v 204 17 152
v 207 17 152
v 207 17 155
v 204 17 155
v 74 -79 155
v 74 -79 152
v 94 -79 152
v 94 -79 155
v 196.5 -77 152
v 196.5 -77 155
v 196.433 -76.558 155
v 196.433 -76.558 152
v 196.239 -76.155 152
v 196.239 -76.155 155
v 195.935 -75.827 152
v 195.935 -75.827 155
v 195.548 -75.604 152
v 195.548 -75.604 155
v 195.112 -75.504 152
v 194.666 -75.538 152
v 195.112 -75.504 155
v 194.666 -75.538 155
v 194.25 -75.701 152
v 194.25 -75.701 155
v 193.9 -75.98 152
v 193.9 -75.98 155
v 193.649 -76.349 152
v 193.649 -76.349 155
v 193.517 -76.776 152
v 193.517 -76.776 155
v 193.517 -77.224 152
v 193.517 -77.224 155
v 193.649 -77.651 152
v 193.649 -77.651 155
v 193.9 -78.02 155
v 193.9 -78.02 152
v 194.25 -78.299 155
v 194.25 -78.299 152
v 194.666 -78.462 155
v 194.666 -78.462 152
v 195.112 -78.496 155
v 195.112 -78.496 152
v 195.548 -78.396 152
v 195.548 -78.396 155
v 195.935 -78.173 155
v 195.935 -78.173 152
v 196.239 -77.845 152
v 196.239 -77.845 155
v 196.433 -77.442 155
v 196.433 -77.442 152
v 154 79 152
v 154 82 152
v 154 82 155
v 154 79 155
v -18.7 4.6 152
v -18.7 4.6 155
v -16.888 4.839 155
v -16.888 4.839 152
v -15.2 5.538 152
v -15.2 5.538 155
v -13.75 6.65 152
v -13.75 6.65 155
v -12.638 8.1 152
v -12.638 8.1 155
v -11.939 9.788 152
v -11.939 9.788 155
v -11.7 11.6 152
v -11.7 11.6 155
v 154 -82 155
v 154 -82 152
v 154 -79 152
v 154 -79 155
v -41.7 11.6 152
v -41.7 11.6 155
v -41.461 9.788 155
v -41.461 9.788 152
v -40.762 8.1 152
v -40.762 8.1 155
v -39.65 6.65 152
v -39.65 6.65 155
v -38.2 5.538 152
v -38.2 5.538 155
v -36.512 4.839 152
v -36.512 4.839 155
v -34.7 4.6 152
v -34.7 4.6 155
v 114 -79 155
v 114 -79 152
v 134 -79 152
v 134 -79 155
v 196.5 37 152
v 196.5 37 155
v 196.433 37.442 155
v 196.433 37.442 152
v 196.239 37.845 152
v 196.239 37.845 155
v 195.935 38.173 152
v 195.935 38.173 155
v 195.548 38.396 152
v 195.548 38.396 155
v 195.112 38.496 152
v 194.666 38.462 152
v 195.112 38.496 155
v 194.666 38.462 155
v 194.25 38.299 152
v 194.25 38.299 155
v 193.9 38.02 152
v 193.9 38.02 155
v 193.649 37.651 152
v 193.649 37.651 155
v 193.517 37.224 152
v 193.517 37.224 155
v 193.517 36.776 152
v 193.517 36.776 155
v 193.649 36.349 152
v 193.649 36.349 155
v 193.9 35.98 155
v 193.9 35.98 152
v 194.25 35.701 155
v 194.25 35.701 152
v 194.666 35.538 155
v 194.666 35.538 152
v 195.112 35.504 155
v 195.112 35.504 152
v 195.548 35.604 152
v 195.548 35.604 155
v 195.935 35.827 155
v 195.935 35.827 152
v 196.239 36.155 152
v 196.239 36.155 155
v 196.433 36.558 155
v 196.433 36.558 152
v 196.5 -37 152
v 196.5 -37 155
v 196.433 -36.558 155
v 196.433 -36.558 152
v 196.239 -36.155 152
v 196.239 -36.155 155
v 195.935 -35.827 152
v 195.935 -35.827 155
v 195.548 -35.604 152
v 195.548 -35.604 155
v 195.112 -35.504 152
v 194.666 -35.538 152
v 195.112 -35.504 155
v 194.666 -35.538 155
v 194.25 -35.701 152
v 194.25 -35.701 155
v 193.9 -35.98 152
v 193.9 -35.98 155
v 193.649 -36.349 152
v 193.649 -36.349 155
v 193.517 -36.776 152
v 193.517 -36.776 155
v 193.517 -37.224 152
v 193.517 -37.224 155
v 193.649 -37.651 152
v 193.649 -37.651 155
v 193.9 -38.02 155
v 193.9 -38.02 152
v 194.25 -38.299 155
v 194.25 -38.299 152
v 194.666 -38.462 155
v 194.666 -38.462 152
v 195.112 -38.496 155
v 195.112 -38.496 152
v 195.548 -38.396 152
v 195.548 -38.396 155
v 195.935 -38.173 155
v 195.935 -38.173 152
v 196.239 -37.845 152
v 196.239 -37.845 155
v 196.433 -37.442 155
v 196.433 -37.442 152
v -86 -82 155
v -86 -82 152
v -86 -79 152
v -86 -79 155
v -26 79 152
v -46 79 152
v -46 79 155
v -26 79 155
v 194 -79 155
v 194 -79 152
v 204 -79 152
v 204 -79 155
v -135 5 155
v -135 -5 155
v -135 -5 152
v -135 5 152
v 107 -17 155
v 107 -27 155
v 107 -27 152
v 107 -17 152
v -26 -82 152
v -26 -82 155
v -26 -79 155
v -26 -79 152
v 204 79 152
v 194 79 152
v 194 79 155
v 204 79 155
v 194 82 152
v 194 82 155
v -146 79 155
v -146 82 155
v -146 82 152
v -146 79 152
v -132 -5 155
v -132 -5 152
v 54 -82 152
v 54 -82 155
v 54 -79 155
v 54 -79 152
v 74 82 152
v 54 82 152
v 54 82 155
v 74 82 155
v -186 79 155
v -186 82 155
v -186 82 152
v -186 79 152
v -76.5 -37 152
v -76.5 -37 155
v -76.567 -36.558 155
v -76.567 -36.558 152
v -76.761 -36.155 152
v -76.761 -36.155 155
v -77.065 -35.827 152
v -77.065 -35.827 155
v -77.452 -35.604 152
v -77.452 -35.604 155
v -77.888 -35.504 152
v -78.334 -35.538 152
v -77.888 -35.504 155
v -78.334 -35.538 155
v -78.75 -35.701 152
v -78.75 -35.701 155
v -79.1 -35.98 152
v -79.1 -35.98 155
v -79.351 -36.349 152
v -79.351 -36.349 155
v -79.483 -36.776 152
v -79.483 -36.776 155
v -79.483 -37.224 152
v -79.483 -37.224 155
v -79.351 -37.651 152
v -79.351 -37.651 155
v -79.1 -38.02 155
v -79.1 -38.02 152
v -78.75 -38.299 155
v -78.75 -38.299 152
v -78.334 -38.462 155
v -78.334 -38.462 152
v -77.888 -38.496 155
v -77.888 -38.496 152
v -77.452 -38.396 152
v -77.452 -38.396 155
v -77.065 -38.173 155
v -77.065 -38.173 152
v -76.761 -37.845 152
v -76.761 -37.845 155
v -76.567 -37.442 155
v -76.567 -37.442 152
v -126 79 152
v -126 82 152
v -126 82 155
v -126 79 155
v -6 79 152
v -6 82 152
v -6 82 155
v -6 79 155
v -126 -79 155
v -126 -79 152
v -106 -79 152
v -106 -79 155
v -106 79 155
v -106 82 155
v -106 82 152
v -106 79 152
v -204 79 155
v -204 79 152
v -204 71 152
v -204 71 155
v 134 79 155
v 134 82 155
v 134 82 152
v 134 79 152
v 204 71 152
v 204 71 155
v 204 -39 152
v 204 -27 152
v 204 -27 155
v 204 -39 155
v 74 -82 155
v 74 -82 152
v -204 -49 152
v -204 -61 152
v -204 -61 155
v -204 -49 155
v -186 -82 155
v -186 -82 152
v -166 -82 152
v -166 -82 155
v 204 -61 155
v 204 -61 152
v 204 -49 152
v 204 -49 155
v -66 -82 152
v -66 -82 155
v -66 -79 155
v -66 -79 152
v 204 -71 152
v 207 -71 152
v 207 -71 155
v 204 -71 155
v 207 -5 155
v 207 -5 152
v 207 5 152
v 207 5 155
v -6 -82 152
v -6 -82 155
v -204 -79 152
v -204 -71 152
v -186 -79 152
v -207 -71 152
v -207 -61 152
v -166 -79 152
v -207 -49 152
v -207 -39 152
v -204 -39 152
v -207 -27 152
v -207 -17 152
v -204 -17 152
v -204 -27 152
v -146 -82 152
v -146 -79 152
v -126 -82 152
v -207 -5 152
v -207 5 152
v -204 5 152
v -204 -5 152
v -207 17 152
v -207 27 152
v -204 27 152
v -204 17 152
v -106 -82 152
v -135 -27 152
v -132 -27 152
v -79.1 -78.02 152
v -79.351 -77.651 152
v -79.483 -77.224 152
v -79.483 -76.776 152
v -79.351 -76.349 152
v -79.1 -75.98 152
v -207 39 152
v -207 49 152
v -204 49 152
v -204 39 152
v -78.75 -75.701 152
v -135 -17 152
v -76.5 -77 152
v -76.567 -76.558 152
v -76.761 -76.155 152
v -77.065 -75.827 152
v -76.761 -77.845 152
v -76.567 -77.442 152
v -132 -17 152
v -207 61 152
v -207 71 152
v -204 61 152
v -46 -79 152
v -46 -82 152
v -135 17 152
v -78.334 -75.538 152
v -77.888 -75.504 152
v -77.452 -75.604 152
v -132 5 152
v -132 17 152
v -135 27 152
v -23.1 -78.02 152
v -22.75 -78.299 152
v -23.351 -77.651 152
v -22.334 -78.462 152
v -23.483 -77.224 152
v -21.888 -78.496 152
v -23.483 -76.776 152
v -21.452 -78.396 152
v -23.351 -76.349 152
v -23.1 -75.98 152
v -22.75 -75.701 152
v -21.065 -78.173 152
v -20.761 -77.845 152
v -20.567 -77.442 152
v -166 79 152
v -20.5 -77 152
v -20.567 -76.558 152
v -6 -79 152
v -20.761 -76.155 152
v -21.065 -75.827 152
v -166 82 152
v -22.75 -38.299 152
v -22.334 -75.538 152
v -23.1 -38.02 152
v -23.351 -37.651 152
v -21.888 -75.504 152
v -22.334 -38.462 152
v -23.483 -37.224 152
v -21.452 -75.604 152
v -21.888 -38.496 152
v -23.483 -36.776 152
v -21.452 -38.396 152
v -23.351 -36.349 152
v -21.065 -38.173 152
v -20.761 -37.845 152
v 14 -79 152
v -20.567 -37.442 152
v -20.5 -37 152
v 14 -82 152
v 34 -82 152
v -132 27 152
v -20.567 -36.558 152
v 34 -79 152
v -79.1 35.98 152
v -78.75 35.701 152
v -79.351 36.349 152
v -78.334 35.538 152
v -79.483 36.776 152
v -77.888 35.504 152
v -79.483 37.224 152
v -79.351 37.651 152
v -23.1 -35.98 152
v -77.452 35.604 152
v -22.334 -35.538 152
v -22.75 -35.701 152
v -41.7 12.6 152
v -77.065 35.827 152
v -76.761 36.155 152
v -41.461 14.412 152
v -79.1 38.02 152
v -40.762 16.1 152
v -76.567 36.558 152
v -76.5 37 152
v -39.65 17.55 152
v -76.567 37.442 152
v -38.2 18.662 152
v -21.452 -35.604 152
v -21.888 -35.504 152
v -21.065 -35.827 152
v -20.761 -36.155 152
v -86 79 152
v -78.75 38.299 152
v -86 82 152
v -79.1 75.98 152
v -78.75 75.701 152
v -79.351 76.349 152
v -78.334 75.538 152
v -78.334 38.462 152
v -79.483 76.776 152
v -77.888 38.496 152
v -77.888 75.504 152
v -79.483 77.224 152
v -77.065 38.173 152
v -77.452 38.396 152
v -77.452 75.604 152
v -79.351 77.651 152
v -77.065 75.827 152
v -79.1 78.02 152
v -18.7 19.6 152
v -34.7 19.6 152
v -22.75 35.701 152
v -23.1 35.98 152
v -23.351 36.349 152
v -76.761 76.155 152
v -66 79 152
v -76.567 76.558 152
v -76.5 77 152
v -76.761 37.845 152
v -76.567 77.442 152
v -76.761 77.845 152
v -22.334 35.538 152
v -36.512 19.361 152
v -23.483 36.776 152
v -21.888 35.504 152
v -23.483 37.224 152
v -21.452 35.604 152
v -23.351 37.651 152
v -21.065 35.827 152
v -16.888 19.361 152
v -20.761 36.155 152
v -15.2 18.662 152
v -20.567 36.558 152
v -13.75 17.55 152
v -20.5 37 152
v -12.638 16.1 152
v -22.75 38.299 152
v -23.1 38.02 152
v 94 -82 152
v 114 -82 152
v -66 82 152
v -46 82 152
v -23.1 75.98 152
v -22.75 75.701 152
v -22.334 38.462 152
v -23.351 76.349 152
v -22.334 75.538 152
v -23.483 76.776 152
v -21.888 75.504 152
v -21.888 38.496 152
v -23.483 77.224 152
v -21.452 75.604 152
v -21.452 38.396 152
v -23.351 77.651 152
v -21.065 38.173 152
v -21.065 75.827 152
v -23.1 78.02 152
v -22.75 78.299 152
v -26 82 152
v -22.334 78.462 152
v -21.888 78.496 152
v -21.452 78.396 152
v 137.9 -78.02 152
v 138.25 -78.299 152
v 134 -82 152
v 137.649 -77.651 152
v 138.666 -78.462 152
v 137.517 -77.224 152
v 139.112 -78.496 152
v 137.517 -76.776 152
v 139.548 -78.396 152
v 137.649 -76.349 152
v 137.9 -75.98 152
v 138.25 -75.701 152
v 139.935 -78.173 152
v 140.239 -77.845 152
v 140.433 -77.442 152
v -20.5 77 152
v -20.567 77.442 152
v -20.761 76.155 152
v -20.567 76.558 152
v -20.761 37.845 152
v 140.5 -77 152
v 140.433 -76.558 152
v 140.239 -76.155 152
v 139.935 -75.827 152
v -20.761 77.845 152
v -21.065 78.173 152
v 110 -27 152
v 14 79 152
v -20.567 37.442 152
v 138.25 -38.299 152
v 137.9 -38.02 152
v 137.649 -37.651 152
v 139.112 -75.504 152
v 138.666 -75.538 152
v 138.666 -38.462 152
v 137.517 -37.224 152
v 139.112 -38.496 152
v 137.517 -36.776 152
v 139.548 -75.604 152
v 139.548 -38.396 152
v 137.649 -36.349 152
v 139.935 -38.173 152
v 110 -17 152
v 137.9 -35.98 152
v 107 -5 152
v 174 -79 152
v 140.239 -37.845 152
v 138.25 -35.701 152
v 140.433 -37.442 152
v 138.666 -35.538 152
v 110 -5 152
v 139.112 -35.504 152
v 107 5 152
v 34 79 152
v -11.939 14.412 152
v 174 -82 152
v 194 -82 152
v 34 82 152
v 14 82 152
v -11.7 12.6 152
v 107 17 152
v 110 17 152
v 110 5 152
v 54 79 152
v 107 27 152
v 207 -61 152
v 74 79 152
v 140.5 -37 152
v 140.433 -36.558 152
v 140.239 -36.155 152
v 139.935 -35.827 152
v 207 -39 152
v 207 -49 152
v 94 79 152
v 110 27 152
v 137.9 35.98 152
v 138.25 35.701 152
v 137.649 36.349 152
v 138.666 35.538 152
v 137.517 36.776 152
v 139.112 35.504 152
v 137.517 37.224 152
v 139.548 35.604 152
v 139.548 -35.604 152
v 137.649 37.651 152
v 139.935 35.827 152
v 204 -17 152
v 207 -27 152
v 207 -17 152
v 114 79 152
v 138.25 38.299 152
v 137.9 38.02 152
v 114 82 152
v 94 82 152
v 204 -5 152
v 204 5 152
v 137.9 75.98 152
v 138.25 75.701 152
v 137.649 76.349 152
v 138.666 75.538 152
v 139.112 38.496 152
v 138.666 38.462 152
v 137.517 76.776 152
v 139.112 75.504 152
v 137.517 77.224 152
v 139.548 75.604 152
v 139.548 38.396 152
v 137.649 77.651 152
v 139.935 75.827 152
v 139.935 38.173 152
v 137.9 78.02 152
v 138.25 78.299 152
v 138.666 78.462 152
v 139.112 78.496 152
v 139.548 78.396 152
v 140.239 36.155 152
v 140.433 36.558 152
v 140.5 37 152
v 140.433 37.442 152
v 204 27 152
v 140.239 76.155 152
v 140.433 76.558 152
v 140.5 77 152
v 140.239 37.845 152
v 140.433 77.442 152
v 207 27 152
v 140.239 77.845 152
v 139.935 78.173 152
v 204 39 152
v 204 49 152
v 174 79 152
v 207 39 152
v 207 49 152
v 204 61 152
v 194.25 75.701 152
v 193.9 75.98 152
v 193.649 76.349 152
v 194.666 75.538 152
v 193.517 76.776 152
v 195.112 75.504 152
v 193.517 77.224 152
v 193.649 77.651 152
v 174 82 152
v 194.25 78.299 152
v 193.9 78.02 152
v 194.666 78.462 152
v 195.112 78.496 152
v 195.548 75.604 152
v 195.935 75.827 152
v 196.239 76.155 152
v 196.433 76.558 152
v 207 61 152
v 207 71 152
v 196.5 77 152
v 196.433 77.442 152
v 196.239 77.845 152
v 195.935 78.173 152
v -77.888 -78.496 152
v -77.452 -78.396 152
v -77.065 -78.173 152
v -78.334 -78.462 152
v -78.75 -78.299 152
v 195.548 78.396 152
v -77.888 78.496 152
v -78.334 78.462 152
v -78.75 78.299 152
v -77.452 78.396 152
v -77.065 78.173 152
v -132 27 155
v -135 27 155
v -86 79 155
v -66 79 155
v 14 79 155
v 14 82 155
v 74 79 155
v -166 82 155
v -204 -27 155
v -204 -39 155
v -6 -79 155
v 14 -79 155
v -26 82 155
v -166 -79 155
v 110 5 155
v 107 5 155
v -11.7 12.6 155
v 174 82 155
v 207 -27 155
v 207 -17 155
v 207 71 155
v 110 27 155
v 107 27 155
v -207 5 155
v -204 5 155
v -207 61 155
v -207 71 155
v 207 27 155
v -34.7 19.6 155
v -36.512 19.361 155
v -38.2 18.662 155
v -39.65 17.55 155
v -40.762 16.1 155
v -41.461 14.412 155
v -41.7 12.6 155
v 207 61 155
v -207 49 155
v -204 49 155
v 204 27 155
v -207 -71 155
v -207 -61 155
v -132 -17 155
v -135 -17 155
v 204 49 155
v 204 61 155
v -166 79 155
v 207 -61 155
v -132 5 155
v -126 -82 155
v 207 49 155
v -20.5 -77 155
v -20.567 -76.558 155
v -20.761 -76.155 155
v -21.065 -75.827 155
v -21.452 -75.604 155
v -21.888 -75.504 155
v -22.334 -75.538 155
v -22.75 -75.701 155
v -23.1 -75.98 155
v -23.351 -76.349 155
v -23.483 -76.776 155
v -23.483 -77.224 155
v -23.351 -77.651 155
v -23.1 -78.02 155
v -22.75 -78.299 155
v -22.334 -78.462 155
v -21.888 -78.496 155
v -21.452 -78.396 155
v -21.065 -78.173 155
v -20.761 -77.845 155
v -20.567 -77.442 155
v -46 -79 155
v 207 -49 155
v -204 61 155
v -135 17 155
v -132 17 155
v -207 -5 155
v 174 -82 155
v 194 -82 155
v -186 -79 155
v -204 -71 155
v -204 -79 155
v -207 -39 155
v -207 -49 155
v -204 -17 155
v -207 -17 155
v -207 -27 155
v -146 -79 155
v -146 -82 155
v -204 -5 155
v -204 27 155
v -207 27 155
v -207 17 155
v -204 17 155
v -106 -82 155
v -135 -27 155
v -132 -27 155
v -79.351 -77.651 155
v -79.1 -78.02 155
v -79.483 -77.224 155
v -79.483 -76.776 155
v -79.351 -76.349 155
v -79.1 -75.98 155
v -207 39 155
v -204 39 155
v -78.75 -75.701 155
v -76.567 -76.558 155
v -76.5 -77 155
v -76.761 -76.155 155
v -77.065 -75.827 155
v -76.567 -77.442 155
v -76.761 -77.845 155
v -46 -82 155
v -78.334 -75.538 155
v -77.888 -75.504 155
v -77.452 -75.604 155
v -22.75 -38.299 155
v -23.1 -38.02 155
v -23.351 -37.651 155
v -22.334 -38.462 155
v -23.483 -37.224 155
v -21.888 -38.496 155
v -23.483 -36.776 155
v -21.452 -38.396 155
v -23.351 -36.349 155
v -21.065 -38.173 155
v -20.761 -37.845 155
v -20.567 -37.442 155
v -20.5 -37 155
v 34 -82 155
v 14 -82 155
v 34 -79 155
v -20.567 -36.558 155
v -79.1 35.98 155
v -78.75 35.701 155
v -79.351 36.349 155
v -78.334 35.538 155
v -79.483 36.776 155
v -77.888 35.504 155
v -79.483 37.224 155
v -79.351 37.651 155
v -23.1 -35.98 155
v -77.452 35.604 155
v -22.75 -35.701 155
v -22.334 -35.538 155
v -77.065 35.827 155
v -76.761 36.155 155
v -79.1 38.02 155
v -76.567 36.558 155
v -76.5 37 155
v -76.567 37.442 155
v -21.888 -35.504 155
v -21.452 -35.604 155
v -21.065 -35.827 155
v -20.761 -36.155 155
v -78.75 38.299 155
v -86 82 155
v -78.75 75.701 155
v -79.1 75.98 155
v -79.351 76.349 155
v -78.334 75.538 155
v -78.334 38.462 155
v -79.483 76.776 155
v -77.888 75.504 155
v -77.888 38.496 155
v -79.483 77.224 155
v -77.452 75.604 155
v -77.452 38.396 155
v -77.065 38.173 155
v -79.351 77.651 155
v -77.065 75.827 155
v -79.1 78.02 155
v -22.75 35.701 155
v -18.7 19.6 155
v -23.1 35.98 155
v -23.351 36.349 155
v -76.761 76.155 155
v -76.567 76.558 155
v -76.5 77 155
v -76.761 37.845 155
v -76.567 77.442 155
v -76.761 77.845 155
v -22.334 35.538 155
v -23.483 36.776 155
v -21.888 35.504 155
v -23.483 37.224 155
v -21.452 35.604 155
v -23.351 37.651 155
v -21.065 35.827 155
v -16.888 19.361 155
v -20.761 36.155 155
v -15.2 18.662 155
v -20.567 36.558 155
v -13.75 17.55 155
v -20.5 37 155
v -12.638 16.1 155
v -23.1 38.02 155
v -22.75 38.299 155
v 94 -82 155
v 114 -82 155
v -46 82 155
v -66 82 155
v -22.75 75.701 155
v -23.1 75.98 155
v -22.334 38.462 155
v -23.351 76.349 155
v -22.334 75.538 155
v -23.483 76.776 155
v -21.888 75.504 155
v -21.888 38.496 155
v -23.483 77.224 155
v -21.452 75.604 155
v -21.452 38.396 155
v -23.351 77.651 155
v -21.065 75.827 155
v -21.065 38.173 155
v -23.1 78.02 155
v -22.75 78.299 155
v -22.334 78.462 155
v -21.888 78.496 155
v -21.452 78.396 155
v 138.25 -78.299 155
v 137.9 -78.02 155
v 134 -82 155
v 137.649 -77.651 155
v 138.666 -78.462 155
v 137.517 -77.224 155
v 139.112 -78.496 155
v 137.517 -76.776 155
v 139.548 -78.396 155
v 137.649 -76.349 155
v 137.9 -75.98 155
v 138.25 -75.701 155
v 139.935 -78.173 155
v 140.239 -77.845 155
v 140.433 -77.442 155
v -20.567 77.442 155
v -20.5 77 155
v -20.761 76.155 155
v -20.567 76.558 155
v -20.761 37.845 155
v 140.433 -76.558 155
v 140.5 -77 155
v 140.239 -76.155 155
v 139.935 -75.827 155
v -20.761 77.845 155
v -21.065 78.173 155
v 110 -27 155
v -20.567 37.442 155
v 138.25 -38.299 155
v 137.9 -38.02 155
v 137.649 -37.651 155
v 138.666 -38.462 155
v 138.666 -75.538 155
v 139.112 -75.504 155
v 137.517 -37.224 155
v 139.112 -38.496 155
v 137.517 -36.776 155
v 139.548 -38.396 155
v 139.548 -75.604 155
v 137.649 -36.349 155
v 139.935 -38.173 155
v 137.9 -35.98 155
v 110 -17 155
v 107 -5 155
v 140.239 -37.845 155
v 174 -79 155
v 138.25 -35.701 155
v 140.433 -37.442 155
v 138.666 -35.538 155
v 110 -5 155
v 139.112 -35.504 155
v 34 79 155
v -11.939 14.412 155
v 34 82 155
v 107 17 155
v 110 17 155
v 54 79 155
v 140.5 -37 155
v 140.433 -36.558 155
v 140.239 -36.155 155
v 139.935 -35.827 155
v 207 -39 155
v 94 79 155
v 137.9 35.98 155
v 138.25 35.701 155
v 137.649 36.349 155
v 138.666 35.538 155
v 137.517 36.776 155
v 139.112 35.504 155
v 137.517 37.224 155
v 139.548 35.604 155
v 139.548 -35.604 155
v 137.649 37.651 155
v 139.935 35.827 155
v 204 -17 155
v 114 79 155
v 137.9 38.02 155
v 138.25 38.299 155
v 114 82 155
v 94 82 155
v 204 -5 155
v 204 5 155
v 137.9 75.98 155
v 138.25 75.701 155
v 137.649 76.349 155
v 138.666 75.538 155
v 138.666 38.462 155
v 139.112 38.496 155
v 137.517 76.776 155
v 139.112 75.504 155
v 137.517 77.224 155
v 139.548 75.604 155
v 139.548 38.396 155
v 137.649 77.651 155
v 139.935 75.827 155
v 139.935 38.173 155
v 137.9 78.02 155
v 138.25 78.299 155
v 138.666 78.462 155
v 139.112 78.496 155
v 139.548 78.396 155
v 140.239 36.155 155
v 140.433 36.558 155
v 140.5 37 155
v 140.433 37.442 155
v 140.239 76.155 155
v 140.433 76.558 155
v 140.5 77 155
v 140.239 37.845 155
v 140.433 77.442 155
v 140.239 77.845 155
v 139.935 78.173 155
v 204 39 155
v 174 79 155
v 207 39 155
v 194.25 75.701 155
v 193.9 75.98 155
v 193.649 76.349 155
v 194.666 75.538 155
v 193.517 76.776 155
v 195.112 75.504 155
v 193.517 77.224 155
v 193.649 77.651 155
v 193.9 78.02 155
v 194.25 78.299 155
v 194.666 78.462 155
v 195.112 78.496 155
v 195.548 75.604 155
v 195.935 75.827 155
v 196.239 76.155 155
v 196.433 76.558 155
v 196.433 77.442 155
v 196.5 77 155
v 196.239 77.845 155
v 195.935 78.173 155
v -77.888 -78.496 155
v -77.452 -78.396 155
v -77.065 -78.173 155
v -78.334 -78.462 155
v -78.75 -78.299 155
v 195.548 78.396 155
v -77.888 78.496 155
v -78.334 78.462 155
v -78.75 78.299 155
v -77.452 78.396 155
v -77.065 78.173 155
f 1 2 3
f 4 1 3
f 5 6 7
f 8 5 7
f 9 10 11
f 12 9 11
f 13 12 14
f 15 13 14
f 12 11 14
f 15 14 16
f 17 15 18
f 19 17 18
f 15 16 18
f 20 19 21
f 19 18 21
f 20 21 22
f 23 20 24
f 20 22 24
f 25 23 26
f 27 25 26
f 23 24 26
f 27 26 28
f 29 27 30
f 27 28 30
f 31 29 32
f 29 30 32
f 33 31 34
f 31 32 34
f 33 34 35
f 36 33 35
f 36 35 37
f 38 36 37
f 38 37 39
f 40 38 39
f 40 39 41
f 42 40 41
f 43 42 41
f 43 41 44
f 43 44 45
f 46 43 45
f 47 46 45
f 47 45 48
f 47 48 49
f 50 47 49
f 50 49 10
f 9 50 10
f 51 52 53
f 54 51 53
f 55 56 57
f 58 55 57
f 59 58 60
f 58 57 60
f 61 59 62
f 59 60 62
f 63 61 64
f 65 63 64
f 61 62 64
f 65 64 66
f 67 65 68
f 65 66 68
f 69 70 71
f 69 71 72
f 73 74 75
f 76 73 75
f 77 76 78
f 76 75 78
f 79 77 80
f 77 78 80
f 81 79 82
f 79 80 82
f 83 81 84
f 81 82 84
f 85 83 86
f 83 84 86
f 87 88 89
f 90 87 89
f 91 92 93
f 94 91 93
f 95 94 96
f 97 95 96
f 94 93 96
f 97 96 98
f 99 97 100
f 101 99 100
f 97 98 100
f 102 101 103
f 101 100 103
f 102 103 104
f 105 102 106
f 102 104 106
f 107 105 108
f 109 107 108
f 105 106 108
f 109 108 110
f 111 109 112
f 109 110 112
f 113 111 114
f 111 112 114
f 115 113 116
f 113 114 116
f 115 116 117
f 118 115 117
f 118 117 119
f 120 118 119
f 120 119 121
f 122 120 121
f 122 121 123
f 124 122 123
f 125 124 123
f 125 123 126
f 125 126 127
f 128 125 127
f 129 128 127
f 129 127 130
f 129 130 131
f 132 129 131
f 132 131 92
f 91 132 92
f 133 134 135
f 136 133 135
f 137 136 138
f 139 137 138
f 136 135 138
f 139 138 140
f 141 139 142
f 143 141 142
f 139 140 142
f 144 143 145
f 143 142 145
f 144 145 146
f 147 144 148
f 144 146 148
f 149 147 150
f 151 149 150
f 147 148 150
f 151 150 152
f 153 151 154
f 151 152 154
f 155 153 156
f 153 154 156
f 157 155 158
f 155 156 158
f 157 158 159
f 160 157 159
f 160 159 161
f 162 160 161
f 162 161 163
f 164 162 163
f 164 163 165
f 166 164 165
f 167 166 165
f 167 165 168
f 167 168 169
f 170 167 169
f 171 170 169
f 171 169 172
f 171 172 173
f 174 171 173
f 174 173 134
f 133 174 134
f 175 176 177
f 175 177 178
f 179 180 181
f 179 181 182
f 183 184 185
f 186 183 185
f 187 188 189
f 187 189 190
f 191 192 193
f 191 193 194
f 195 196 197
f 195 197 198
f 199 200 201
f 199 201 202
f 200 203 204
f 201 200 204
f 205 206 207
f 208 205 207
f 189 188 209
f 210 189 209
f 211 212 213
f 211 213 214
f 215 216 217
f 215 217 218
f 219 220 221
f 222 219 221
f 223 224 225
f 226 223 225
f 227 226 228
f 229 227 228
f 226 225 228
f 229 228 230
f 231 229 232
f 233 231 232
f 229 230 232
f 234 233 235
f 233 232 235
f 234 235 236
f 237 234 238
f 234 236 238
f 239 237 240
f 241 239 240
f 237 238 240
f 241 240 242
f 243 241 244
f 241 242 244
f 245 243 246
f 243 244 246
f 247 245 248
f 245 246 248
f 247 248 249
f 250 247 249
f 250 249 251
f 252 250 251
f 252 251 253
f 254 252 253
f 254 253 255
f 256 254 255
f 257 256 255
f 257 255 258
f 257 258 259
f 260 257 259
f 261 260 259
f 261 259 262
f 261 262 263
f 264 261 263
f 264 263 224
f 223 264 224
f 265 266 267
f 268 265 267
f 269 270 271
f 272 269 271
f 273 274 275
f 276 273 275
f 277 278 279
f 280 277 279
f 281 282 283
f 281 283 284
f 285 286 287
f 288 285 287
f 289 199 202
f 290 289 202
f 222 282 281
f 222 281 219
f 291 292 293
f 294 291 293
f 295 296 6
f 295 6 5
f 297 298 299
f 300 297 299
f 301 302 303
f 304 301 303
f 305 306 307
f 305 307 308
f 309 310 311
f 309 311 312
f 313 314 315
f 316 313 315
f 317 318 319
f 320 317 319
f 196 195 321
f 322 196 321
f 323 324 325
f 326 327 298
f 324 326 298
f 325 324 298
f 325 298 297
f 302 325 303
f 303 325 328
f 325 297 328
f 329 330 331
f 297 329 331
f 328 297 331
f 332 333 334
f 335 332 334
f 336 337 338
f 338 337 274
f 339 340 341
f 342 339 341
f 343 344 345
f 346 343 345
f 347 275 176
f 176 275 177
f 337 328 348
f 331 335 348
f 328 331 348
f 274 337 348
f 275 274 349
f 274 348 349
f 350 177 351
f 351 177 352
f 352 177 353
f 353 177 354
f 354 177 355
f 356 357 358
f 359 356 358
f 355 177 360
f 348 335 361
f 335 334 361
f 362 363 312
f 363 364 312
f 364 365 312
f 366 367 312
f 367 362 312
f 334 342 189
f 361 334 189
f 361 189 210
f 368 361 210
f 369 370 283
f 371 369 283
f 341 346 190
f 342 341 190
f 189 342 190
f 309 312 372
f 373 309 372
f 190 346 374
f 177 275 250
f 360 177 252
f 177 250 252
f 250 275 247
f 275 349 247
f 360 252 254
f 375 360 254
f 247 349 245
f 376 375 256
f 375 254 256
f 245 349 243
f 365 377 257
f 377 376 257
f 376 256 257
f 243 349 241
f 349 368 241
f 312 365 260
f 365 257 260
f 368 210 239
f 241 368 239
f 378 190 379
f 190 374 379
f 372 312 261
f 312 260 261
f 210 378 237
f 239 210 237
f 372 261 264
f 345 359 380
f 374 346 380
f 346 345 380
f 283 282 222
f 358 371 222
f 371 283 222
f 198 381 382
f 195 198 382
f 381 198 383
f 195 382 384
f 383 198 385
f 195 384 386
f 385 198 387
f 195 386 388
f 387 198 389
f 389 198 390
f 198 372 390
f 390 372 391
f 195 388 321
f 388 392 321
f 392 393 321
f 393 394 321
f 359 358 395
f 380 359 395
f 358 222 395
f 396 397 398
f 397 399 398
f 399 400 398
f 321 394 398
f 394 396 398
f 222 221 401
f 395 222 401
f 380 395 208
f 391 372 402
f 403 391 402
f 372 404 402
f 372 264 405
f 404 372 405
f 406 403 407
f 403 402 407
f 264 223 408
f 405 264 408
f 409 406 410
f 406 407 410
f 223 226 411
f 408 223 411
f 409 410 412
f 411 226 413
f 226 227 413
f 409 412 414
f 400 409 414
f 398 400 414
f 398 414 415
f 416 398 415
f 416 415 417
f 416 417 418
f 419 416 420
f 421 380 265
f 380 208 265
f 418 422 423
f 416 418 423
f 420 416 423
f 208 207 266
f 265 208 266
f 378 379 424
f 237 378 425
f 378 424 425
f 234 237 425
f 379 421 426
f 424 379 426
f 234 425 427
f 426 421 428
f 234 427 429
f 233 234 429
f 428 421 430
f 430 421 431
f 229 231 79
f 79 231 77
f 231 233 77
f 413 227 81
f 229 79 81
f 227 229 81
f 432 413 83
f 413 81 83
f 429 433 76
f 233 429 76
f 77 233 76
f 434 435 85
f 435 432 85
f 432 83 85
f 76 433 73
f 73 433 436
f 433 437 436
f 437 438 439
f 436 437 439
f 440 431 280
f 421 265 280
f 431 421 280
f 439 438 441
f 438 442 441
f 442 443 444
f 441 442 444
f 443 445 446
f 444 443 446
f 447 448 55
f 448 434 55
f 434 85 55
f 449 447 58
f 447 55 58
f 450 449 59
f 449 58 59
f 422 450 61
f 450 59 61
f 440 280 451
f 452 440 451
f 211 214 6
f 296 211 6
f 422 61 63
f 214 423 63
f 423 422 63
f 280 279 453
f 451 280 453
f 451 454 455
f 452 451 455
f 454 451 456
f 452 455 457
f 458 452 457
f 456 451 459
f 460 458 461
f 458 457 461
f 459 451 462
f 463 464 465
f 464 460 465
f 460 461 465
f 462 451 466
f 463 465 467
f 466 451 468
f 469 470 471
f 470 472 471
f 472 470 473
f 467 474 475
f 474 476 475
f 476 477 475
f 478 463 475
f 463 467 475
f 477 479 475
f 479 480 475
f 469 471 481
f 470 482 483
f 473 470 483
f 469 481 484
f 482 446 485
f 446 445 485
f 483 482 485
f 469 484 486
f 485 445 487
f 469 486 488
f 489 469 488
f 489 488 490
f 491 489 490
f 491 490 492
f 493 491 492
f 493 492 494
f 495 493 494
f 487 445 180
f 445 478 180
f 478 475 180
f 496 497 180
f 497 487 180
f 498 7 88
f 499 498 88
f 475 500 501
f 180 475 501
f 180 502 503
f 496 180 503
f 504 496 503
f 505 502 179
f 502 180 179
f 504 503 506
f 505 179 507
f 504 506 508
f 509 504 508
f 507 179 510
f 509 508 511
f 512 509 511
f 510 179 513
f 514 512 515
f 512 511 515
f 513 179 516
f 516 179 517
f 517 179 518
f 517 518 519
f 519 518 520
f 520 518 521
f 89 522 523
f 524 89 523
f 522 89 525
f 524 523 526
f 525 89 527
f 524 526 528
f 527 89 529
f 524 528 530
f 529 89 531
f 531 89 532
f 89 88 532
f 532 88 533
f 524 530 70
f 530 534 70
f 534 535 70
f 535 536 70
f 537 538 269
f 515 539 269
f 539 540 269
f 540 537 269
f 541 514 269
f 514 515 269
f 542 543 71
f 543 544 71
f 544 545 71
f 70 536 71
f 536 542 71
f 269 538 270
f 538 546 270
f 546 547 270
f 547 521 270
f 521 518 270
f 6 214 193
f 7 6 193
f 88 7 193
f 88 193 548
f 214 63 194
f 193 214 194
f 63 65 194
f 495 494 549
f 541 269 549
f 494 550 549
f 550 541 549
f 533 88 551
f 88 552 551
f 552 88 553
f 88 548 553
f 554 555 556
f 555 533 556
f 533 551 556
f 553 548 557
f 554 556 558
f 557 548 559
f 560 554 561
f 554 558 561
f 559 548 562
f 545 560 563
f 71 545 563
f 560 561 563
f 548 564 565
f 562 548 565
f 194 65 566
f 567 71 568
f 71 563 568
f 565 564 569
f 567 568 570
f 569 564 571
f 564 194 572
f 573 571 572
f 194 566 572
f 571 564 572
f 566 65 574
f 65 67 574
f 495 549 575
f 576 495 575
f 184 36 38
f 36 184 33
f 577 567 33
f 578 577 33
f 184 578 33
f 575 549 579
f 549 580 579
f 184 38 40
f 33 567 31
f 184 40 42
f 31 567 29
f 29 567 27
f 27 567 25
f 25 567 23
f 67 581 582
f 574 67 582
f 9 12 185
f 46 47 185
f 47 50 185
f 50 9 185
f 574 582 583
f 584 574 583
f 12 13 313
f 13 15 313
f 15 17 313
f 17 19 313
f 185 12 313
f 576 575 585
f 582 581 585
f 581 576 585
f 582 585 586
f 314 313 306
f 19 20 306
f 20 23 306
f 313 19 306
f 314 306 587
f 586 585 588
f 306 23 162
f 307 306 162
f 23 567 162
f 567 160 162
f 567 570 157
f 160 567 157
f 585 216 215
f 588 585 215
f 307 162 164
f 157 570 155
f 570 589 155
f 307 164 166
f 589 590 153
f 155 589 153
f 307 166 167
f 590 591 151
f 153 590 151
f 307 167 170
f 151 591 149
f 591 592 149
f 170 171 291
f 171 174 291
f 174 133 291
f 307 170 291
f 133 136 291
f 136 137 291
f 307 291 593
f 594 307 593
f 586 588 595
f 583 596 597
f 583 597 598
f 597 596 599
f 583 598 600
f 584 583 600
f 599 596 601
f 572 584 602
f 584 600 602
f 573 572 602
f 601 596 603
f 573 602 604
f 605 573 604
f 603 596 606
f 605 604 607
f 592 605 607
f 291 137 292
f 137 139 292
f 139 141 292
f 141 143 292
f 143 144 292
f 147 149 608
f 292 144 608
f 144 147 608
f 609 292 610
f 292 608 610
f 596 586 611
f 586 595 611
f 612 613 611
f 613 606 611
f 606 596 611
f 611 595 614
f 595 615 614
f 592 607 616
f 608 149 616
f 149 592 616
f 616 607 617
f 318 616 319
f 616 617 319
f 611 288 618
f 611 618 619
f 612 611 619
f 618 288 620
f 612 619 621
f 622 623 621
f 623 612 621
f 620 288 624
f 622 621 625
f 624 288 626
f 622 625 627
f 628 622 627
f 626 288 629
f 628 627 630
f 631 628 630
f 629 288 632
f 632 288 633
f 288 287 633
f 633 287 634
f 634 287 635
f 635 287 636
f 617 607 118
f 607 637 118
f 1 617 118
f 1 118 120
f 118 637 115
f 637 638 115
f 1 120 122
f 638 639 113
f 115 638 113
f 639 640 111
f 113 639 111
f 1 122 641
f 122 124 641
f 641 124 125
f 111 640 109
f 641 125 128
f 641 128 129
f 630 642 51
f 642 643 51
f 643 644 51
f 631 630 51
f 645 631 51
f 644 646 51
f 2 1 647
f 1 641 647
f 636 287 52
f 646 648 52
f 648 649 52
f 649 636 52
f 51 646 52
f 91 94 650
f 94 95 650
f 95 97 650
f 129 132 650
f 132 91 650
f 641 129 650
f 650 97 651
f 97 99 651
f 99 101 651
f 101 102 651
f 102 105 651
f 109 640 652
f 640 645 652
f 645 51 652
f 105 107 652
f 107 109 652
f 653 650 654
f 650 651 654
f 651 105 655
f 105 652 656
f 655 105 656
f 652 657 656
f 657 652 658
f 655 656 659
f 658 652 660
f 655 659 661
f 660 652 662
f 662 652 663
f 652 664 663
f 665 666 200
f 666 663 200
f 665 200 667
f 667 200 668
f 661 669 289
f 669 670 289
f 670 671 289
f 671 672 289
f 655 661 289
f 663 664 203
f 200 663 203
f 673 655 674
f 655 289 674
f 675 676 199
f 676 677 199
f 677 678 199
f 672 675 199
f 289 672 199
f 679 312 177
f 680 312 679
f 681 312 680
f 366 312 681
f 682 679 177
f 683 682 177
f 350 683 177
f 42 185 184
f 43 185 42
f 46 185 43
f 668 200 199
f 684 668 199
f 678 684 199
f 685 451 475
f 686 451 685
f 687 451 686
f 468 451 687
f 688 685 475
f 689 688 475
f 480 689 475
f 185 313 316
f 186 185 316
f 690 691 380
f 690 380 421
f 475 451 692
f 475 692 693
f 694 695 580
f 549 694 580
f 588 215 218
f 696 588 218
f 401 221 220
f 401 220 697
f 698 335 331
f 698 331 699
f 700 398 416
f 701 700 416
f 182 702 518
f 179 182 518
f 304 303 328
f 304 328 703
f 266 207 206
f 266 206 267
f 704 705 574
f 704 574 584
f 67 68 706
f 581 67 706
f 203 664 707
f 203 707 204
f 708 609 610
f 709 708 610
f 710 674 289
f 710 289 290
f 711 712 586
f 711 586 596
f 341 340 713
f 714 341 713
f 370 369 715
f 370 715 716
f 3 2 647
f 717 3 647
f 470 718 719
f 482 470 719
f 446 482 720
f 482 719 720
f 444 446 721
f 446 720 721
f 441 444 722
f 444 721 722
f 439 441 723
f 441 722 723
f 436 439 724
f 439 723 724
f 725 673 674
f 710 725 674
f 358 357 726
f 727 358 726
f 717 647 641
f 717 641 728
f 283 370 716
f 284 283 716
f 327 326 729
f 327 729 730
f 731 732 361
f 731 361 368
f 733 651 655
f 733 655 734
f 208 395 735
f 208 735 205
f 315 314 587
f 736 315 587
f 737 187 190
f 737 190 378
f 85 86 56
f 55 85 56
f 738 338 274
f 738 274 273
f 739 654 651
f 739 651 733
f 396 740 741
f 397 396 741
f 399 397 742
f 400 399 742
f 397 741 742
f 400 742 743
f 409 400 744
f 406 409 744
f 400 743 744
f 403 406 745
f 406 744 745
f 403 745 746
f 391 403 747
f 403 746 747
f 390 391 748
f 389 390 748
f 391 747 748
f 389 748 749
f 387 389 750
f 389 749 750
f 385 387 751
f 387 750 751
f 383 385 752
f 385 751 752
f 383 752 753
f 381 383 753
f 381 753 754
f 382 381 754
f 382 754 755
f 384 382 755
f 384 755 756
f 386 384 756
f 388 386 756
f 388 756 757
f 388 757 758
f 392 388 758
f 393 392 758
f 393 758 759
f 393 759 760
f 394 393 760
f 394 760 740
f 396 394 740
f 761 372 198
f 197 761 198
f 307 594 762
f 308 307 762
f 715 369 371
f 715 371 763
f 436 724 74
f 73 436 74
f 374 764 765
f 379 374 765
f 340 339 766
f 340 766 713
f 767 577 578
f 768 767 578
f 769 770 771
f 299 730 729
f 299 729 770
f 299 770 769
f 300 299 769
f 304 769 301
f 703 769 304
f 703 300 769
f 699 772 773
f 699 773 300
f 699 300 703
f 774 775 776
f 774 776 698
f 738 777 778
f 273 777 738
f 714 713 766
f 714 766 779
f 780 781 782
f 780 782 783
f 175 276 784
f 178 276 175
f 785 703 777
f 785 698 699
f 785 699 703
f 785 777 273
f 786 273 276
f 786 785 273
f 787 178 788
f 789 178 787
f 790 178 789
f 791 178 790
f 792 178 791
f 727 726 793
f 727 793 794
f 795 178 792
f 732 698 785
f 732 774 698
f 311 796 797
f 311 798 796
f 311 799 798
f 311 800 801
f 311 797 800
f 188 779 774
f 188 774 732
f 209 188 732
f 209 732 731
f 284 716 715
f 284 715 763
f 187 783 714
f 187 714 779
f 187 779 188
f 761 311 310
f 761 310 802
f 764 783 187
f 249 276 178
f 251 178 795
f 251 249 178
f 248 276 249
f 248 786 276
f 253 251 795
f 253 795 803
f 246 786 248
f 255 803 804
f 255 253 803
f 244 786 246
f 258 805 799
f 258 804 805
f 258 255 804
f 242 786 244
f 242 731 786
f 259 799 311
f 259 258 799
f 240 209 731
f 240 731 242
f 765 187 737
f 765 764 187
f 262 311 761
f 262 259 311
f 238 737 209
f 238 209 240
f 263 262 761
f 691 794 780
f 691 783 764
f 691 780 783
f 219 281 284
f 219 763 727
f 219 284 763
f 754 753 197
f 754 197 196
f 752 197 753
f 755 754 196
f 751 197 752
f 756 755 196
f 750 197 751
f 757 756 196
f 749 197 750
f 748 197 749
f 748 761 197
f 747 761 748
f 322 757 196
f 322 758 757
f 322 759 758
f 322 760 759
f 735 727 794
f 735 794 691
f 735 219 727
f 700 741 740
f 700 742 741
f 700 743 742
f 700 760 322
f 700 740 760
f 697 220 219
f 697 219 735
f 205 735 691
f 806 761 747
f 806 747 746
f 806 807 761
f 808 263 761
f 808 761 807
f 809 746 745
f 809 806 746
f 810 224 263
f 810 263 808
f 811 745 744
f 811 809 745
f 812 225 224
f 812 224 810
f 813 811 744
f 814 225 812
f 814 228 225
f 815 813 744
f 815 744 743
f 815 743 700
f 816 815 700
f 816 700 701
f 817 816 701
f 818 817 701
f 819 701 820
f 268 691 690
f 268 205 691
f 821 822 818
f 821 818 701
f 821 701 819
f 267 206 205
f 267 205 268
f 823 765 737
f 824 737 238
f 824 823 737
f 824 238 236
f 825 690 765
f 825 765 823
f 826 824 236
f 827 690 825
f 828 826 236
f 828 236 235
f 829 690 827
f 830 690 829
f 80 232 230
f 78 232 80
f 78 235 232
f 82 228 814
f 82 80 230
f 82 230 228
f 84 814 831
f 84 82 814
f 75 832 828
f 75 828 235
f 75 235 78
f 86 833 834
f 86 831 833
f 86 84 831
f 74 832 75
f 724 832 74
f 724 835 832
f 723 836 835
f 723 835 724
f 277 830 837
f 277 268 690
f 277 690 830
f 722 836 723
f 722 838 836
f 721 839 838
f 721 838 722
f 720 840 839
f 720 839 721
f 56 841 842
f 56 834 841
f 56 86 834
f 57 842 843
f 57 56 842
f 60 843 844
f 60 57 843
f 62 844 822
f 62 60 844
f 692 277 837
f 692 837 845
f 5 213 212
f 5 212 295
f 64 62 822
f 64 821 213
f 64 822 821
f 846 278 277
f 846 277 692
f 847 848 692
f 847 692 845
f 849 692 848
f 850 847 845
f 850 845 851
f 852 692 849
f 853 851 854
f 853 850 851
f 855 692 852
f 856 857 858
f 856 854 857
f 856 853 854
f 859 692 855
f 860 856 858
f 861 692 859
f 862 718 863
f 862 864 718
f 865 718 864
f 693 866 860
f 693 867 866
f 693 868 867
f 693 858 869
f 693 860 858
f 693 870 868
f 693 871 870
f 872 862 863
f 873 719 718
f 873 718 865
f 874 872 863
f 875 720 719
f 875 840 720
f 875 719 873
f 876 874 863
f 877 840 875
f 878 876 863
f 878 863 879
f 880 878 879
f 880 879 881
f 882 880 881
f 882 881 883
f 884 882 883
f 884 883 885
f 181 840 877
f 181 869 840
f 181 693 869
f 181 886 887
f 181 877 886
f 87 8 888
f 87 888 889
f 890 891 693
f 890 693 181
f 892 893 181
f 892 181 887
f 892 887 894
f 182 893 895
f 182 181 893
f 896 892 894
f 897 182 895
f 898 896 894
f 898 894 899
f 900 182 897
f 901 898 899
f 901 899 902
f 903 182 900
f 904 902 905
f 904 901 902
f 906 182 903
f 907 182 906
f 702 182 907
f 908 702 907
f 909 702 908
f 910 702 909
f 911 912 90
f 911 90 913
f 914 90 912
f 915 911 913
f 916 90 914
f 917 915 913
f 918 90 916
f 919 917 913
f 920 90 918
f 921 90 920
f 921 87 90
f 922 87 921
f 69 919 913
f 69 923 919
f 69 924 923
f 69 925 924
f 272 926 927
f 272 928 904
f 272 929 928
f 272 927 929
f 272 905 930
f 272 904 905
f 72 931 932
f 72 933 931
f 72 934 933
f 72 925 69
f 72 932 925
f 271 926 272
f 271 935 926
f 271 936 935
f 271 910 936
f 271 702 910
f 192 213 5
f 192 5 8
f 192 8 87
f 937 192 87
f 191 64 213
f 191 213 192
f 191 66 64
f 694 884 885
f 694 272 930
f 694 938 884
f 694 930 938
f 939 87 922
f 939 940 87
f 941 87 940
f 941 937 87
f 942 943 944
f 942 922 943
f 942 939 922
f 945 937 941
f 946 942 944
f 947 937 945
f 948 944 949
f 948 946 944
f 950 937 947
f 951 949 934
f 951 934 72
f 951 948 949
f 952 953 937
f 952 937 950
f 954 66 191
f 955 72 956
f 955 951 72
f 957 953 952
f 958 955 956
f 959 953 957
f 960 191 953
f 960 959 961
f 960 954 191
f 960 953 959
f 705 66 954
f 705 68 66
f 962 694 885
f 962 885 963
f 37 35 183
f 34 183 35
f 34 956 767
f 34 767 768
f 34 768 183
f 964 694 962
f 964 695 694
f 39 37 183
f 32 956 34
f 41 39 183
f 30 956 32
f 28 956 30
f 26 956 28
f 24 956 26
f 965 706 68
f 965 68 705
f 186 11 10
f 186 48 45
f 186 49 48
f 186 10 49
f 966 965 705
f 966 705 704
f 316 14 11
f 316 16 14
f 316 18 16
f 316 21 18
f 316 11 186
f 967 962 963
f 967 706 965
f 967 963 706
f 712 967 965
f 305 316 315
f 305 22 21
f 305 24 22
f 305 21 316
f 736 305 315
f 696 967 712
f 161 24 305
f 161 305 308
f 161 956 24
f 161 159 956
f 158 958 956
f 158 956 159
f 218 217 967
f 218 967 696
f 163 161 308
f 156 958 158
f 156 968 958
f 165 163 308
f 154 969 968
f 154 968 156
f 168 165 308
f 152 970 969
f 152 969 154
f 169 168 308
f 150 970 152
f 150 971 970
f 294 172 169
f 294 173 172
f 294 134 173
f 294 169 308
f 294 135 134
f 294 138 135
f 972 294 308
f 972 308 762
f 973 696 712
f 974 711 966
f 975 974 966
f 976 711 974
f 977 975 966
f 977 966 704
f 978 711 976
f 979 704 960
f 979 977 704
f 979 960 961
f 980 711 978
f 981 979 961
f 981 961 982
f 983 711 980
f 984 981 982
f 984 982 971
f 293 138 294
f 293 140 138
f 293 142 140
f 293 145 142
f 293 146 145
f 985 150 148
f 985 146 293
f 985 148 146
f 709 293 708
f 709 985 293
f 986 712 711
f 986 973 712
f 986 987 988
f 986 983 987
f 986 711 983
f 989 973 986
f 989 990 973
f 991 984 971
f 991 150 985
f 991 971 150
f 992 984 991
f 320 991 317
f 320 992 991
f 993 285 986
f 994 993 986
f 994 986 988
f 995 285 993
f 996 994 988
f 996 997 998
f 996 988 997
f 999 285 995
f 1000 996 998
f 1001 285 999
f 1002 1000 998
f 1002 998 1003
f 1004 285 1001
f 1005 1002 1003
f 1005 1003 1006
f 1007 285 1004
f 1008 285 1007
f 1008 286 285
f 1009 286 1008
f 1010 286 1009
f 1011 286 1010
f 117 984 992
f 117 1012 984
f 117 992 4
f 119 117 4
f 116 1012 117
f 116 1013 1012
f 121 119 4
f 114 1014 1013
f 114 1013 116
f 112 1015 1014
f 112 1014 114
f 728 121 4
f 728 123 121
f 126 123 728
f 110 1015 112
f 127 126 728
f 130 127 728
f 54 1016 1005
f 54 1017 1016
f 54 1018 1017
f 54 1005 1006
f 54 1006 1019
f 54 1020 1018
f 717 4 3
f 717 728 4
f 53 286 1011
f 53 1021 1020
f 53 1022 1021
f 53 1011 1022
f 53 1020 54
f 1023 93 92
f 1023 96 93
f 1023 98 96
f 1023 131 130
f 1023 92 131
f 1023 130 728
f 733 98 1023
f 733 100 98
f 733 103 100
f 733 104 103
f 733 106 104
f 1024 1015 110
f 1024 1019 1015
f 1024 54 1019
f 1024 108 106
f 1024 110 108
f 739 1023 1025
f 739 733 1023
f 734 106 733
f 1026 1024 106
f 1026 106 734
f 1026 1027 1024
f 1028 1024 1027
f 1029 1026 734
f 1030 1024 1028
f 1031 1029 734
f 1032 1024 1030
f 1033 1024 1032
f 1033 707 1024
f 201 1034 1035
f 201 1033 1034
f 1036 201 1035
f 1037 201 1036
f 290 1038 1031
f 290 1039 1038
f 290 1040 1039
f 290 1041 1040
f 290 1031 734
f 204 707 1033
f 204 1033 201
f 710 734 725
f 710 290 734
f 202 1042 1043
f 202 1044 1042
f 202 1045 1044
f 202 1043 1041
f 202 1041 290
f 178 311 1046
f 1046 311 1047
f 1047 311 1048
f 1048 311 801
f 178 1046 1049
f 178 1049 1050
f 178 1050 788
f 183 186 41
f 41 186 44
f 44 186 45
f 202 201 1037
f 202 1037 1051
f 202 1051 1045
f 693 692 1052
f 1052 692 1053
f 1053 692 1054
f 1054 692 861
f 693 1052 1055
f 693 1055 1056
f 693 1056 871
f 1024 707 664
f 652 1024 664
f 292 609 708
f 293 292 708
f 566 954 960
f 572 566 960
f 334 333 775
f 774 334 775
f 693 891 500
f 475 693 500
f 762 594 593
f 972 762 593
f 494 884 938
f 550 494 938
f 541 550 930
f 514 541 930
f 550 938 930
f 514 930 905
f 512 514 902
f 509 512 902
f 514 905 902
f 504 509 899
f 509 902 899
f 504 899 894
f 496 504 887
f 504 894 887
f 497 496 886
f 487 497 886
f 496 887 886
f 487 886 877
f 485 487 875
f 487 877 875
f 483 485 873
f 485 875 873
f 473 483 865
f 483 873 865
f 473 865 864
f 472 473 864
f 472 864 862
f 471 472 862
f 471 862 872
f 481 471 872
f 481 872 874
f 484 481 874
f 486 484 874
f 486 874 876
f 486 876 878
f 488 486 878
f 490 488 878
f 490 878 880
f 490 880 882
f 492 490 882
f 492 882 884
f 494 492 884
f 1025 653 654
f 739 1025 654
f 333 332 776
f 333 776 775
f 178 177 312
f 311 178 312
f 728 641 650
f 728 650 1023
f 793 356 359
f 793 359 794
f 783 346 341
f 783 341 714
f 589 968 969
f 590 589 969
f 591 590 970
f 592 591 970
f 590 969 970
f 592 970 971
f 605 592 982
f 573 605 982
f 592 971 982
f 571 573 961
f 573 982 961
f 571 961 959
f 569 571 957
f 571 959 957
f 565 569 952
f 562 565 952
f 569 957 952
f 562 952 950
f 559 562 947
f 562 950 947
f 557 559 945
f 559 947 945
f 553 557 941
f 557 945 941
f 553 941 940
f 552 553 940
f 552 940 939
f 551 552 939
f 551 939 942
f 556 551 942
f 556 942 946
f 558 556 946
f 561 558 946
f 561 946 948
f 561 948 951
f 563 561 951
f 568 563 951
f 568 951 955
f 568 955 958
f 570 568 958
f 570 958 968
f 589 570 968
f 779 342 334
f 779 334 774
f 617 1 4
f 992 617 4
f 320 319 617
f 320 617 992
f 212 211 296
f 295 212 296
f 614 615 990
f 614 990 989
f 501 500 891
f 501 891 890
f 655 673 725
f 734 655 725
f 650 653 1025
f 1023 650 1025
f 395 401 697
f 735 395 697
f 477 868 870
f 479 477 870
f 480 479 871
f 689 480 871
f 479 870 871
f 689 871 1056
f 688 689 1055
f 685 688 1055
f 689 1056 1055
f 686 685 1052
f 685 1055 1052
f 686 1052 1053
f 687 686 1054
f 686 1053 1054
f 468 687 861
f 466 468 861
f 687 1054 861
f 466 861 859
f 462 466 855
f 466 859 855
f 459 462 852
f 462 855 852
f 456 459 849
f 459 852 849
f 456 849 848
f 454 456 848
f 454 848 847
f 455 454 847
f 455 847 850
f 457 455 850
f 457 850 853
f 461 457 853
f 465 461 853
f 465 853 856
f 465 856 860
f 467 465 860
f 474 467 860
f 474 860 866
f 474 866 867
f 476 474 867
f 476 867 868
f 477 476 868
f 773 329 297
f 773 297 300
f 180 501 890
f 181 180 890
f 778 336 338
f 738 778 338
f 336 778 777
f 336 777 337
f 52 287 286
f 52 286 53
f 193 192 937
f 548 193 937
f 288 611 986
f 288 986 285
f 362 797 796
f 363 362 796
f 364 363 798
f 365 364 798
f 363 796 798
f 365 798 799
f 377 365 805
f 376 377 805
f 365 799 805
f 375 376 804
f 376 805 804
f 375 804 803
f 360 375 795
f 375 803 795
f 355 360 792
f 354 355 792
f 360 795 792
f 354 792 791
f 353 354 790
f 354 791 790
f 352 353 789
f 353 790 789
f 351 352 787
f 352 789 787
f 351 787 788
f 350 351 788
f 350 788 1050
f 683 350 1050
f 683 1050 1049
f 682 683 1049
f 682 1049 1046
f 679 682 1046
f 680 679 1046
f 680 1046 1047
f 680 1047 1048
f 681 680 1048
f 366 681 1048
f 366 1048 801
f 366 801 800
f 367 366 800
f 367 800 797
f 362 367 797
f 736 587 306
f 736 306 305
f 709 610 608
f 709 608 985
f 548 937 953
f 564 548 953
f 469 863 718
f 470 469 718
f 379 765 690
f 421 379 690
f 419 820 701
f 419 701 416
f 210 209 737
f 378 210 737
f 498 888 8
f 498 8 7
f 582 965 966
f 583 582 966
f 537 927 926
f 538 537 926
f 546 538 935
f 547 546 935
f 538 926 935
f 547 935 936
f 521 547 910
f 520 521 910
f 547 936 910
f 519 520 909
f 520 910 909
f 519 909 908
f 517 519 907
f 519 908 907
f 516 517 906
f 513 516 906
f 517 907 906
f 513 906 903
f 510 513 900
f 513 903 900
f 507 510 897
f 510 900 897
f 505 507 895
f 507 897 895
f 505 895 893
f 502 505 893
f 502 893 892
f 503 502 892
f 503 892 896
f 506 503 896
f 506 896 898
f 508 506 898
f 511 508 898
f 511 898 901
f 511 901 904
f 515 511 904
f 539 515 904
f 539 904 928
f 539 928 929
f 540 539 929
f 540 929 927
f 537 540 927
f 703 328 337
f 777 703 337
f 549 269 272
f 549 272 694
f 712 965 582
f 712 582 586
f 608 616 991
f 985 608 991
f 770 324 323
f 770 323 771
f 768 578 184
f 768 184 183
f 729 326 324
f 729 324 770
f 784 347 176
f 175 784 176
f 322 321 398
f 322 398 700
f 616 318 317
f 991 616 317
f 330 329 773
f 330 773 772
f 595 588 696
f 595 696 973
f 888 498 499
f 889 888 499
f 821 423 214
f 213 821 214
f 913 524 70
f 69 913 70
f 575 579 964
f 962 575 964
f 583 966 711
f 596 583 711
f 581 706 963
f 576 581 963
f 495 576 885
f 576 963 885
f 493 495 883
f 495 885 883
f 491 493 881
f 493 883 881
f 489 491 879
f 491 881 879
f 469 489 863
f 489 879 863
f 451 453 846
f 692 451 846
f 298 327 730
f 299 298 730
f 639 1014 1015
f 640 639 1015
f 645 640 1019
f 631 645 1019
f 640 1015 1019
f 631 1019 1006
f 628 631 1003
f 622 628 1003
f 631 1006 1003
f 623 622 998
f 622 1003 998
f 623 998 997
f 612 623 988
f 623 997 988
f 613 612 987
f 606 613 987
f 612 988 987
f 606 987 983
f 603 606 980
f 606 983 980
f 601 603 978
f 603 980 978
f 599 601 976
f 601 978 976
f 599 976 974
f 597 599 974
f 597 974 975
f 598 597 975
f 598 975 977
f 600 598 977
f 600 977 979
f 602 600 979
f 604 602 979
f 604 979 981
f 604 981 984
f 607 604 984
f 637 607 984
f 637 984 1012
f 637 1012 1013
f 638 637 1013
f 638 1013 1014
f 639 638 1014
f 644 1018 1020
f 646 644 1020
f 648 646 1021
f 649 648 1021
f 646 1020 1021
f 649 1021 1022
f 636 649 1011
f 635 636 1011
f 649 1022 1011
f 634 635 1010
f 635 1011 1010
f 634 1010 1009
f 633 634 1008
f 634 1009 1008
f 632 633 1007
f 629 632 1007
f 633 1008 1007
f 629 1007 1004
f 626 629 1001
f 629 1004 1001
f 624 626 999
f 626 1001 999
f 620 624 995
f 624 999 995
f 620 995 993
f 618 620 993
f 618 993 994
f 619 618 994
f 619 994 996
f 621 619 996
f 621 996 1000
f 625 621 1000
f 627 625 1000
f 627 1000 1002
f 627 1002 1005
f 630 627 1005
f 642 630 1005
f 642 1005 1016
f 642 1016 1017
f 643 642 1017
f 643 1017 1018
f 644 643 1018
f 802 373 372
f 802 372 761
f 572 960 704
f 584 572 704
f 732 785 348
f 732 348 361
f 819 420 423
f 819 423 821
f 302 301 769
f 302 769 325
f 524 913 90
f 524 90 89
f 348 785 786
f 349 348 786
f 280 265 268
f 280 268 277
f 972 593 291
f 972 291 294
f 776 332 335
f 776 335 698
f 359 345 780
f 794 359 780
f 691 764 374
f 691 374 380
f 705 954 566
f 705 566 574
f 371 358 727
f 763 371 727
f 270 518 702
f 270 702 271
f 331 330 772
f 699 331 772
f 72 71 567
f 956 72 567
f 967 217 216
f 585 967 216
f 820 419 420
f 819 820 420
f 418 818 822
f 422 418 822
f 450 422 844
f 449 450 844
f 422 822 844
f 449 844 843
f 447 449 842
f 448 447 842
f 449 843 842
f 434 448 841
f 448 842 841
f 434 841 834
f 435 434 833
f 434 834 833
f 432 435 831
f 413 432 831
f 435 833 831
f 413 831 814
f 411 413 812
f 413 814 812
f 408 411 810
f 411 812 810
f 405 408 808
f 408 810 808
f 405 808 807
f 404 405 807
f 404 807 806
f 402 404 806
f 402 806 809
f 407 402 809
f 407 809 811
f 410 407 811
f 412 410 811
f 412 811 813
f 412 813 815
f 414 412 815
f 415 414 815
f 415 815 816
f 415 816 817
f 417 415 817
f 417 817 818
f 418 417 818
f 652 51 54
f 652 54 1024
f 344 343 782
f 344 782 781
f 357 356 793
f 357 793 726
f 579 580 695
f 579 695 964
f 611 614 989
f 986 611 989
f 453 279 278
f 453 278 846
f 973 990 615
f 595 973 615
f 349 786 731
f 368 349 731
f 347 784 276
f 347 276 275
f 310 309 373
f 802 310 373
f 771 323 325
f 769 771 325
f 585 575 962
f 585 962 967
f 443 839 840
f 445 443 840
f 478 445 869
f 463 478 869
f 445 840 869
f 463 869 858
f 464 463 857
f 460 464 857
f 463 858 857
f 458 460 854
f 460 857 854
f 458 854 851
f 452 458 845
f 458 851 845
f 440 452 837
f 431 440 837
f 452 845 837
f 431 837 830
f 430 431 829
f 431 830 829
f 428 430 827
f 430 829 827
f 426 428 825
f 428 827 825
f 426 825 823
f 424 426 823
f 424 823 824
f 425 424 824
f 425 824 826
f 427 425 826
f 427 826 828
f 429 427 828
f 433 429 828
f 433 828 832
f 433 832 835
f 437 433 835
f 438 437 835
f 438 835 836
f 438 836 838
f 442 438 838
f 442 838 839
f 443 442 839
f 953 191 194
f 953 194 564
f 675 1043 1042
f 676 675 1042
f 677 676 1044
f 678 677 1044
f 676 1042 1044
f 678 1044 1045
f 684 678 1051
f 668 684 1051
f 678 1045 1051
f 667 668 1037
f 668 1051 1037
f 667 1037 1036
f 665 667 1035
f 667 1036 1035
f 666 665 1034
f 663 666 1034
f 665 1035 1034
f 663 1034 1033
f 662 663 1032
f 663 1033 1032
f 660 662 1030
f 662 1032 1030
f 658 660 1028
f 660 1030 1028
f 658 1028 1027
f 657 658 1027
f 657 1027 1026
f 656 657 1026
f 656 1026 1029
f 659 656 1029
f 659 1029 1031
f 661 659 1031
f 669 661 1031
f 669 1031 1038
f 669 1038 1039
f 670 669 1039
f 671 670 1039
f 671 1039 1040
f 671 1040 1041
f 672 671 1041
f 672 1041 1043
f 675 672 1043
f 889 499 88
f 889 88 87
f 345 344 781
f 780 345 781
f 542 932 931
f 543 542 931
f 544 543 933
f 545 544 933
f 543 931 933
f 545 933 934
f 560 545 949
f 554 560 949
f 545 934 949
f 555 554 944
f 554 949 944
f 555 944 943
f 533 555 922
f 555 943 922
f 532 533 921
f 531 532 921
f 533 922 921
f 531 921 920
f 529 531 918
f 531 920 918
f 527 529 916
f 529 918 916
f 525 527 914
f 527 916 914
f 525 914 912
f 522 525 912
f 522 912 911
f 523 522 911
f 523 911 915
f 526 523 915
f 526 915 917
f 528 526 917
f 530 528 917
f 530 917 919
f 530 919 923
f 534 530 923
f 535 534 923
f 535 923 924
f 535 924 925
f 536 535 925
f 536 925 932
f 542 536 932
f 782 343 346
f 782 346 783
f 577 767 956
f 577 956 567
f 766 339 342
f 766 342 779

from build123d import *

# Parameters (mm, degrees)
SKETCH1_W           = 414
SKETCH1_H           = 164
BOSS_EXTRUDE1_DEPTH = 3
SKETCH2_W           = 3
SKETCH2_H           = 11
SKETCH2_H_2         = 12
CUT_EXTRUDE1_DEPTH  = 3
CUT_EXTRUDE2_DEPTH  = 3
SKETCH4_R           = 1.5
SKETCH4_W           = 3
SKETCH4_H           = 10
CUT_EXTRUDE3_DEPTH  = 10
CUT_EXTRUDE4_DEPTH  = 10


with BuildPart() as part:
    # Sketch1 → Boss-Extrude1 (new body)
    with BuildSketch(Plane.XY.offset(152)):
        Rectangle(SKETCH1_W, SKETCH1_H)
    extrude(amount=BOSS_EXTRUDE1_DEPTH)

    # Sketch2 → Cut-Extrude1 (cut)
    with BuildSketch(Plane.ZY.offset(207)):
        with Locations((153.5, -76.5)):
            Rectangle(SKETCH2_W, SKETCH2_H)
        with Locations((153.5, -55)):
            Rectangle(SKETCH2_W, SKETCH2_H_2)
        with Locations((153.5, -33)):
            Rectangle(SKETCH2_W, SKETCH2_H_2)
        with Locations((153.5, -11)):
            Rectangle(SKETCH2_W, SKETCH2_H_2)
        with Locations((153.5, 11)):
            Rectangle(SKETCH2_W, SKETCH2_H_2)
        with Locations((153.5, 33)):
            Rectangle(SKETCH2_W, SKETCH2_H_2)
        with Locations((153.5, 55)):
            Rectangle(SKETCH2_W, SKETCH2_H_2)
        with Locations((153.5, 76.5)):
            Rectangle(SKETCH2_W, SKETCH2_H)
    cut_extrude1 = extrude(amount=-CUT_EXTRUDE1_DEPTH, mode=Mode.SUBTRACT)

    # Mirror1: Cut-Extrude1 across plane
    add(cut_extrude1.mirror(Plane(origin=(0, 0, 0), x_dir=(0, 0, 1), z_dir=(1, 0, 0))), mode=Mode.SUBTRACT)

    # Sketch3 → Cut-Extrude2 (cut)
    with BuildSketch(Plane(origin=(0, 82, 0), x_dir=(1, 0, 0), z_dir=(0, 1, 0))):
        Polygon((174, -152), (194, -152), (194, -155), (204, -155), (204, -145), (207, -145), (207, -133), (204, -133), (204, -123), (207, -123), (207, -111), (204, -111), (204, -101), (207, -101), (207, -89), (204, -89), (204, -79), (207, -79), (207, -67), (204, -67), (204, -57), (207, -57), (207, -45), (204, -45), (204, -35), (207, -35), (207, -23), (204, -23), (204, -16), (-204, -16), (-204, -23), (-207, -23), (-207, -35), (-204, -35), (-204, -45), (-207, -45), (-207, -57), (-204, -57), (-204, -67), (-207, -67), (-207, -79), (-204, -79), (-204, -89), (-207, -89), (-207, -101), (-204, -101), (-204, -111), (-207, -111), (-207, -123), (-204, -123), (-204, -133), (-207, -133), (-207, -145), (-204, -145), (-204, -155), (-186, -155), (-186, -152), (-166, -152), (-166, -155), (-146, -155), (-146, -152), (-126, -152), (-126, -155), (-106, -155), (-106, -152), (-86, -152), (-86, -155), (-66, -155), (-66, -152), (-46, -152), (-46, -155), (-26, -155), (-26, -152), (-6, -152), (-6, -155), (14, -155), (14, -152), (34, -152), (34, -155), (54, -155), (54, -152), (74, -152), (74, -155), (94, -155), (94, -152), (114, -152), (114, -155), (134, -155), (134, -152), (154, -152), (154, -155), (174, -155), align=None)
    cut_extrude2 = extrude(amount=-CUT_EXTRUDE2_DEPTH, mode=Mode.SUBTRACT)

    # Mirror2: Cut-Extrude2 across plane
    add(cut_extrude2.mirror(Plane.ZX), mode=Mode.SUBTRACT)

    # Sketch4 → Cut-Extrude3 (cut)
    with BuildSketch(Plane.XY.offset(155)):
        with Locations((139, 37)):
            Circle(SKETCH4_R)
        with Locations((195, 37)):
            Circle(SKETCH4_R)
        with Locations((195, 77)):
            Circle(SKETCH4_R)
        with Locations((139, 77)):
            Circle(SKETCH4_R)
        with Locations((-78, 77)):
            Circle(SKETCH4_R)
        with Locations((-22, 77)):
            Circle(SKETCH4_R)
        with Locations((-78, 37)):
            Circle(SKETCH4_R)
        with Locations((-22, 37)):
            Circle(SKETCH4_R)
        with Locations((139, -77)):
            Circle(SKETCH4_R)
        with Locations((195, -77)):
            Circle(SKETCH4_R)
        with Locations((195, -37)):
            Circle(SKETCH4_R)
        with Locations((139, -37)):
            Circle(SKETCH4_R)
        with Locations((-22, -37)):
            Circle(SKETCH4_R)
        with Locations((-78, -37)):
            Circle(SKETCH4_R)
        with Locations((-22, -77)):
            Circle(SKETCH4_R)
        with Locations((-78, -77)):
            Circle(SKETCH4_R)
        with Locations((-133.5, 22)):
            Rectangle(SKETCH4_W, SKETCH4_H)
        with Locations((-133.5, 0)):
            Rectangle(SKETCH4_W, SKETCH4_H)
        with Locations((-133.5, -22)):
            Rectangle(SKETCH4_W, SKETCH4_H)
        with Locations((108.5, 22)):
            Rectangle(SKETCH4_W, SKETCH4_H)
        with Locations((108.5, 0)):
            Rectangle(SKETCH4_W, SKETCH4_H)
        with Locations((108.5, -22)):
            Rectangle(SKETCH4_W, SKETCH4_H)
    extrude(amount=-CUT_EXTRUDE3_DEPTH, mode=Mode.SUBTRACT)

    # Sketch5 → Cut-Extrude4 (cut)
    with BuildSketch(Plane.XY.offset(155)):
        with BuildLine():
            Line((-34.7, 4.6), (-18.7, 4.6))
            ThreePointArc((-18.7, 4.6), (-13.750252532, 6.650252532), (-11.7, 11.6))
            Line((-11.7, 11.6), (-11.7, 12.6))
            ThreePointArc((-11.7, 12.6), (-13.750252532, 17.549747468), (-18.7, 19.6))
            Line((-18.7, 19.6), (-34.7, 19.6))
            ThreePointArc((-34.7, 19.6), (-39.649747468, 17.549747468), (-41.7, 12.6))
            Line((-41.7, 12.6), (-41.7, 11.6))
            ThreePointArc((-41.7, 11.6), (-39.649747468, 6.650252532), (-34.7, 4.6))
        make_face()
    extrude(amount=-CUT_EXTRUDE4_DEPTH, mode=Mode.SUBTRACT)


solid = part.part
